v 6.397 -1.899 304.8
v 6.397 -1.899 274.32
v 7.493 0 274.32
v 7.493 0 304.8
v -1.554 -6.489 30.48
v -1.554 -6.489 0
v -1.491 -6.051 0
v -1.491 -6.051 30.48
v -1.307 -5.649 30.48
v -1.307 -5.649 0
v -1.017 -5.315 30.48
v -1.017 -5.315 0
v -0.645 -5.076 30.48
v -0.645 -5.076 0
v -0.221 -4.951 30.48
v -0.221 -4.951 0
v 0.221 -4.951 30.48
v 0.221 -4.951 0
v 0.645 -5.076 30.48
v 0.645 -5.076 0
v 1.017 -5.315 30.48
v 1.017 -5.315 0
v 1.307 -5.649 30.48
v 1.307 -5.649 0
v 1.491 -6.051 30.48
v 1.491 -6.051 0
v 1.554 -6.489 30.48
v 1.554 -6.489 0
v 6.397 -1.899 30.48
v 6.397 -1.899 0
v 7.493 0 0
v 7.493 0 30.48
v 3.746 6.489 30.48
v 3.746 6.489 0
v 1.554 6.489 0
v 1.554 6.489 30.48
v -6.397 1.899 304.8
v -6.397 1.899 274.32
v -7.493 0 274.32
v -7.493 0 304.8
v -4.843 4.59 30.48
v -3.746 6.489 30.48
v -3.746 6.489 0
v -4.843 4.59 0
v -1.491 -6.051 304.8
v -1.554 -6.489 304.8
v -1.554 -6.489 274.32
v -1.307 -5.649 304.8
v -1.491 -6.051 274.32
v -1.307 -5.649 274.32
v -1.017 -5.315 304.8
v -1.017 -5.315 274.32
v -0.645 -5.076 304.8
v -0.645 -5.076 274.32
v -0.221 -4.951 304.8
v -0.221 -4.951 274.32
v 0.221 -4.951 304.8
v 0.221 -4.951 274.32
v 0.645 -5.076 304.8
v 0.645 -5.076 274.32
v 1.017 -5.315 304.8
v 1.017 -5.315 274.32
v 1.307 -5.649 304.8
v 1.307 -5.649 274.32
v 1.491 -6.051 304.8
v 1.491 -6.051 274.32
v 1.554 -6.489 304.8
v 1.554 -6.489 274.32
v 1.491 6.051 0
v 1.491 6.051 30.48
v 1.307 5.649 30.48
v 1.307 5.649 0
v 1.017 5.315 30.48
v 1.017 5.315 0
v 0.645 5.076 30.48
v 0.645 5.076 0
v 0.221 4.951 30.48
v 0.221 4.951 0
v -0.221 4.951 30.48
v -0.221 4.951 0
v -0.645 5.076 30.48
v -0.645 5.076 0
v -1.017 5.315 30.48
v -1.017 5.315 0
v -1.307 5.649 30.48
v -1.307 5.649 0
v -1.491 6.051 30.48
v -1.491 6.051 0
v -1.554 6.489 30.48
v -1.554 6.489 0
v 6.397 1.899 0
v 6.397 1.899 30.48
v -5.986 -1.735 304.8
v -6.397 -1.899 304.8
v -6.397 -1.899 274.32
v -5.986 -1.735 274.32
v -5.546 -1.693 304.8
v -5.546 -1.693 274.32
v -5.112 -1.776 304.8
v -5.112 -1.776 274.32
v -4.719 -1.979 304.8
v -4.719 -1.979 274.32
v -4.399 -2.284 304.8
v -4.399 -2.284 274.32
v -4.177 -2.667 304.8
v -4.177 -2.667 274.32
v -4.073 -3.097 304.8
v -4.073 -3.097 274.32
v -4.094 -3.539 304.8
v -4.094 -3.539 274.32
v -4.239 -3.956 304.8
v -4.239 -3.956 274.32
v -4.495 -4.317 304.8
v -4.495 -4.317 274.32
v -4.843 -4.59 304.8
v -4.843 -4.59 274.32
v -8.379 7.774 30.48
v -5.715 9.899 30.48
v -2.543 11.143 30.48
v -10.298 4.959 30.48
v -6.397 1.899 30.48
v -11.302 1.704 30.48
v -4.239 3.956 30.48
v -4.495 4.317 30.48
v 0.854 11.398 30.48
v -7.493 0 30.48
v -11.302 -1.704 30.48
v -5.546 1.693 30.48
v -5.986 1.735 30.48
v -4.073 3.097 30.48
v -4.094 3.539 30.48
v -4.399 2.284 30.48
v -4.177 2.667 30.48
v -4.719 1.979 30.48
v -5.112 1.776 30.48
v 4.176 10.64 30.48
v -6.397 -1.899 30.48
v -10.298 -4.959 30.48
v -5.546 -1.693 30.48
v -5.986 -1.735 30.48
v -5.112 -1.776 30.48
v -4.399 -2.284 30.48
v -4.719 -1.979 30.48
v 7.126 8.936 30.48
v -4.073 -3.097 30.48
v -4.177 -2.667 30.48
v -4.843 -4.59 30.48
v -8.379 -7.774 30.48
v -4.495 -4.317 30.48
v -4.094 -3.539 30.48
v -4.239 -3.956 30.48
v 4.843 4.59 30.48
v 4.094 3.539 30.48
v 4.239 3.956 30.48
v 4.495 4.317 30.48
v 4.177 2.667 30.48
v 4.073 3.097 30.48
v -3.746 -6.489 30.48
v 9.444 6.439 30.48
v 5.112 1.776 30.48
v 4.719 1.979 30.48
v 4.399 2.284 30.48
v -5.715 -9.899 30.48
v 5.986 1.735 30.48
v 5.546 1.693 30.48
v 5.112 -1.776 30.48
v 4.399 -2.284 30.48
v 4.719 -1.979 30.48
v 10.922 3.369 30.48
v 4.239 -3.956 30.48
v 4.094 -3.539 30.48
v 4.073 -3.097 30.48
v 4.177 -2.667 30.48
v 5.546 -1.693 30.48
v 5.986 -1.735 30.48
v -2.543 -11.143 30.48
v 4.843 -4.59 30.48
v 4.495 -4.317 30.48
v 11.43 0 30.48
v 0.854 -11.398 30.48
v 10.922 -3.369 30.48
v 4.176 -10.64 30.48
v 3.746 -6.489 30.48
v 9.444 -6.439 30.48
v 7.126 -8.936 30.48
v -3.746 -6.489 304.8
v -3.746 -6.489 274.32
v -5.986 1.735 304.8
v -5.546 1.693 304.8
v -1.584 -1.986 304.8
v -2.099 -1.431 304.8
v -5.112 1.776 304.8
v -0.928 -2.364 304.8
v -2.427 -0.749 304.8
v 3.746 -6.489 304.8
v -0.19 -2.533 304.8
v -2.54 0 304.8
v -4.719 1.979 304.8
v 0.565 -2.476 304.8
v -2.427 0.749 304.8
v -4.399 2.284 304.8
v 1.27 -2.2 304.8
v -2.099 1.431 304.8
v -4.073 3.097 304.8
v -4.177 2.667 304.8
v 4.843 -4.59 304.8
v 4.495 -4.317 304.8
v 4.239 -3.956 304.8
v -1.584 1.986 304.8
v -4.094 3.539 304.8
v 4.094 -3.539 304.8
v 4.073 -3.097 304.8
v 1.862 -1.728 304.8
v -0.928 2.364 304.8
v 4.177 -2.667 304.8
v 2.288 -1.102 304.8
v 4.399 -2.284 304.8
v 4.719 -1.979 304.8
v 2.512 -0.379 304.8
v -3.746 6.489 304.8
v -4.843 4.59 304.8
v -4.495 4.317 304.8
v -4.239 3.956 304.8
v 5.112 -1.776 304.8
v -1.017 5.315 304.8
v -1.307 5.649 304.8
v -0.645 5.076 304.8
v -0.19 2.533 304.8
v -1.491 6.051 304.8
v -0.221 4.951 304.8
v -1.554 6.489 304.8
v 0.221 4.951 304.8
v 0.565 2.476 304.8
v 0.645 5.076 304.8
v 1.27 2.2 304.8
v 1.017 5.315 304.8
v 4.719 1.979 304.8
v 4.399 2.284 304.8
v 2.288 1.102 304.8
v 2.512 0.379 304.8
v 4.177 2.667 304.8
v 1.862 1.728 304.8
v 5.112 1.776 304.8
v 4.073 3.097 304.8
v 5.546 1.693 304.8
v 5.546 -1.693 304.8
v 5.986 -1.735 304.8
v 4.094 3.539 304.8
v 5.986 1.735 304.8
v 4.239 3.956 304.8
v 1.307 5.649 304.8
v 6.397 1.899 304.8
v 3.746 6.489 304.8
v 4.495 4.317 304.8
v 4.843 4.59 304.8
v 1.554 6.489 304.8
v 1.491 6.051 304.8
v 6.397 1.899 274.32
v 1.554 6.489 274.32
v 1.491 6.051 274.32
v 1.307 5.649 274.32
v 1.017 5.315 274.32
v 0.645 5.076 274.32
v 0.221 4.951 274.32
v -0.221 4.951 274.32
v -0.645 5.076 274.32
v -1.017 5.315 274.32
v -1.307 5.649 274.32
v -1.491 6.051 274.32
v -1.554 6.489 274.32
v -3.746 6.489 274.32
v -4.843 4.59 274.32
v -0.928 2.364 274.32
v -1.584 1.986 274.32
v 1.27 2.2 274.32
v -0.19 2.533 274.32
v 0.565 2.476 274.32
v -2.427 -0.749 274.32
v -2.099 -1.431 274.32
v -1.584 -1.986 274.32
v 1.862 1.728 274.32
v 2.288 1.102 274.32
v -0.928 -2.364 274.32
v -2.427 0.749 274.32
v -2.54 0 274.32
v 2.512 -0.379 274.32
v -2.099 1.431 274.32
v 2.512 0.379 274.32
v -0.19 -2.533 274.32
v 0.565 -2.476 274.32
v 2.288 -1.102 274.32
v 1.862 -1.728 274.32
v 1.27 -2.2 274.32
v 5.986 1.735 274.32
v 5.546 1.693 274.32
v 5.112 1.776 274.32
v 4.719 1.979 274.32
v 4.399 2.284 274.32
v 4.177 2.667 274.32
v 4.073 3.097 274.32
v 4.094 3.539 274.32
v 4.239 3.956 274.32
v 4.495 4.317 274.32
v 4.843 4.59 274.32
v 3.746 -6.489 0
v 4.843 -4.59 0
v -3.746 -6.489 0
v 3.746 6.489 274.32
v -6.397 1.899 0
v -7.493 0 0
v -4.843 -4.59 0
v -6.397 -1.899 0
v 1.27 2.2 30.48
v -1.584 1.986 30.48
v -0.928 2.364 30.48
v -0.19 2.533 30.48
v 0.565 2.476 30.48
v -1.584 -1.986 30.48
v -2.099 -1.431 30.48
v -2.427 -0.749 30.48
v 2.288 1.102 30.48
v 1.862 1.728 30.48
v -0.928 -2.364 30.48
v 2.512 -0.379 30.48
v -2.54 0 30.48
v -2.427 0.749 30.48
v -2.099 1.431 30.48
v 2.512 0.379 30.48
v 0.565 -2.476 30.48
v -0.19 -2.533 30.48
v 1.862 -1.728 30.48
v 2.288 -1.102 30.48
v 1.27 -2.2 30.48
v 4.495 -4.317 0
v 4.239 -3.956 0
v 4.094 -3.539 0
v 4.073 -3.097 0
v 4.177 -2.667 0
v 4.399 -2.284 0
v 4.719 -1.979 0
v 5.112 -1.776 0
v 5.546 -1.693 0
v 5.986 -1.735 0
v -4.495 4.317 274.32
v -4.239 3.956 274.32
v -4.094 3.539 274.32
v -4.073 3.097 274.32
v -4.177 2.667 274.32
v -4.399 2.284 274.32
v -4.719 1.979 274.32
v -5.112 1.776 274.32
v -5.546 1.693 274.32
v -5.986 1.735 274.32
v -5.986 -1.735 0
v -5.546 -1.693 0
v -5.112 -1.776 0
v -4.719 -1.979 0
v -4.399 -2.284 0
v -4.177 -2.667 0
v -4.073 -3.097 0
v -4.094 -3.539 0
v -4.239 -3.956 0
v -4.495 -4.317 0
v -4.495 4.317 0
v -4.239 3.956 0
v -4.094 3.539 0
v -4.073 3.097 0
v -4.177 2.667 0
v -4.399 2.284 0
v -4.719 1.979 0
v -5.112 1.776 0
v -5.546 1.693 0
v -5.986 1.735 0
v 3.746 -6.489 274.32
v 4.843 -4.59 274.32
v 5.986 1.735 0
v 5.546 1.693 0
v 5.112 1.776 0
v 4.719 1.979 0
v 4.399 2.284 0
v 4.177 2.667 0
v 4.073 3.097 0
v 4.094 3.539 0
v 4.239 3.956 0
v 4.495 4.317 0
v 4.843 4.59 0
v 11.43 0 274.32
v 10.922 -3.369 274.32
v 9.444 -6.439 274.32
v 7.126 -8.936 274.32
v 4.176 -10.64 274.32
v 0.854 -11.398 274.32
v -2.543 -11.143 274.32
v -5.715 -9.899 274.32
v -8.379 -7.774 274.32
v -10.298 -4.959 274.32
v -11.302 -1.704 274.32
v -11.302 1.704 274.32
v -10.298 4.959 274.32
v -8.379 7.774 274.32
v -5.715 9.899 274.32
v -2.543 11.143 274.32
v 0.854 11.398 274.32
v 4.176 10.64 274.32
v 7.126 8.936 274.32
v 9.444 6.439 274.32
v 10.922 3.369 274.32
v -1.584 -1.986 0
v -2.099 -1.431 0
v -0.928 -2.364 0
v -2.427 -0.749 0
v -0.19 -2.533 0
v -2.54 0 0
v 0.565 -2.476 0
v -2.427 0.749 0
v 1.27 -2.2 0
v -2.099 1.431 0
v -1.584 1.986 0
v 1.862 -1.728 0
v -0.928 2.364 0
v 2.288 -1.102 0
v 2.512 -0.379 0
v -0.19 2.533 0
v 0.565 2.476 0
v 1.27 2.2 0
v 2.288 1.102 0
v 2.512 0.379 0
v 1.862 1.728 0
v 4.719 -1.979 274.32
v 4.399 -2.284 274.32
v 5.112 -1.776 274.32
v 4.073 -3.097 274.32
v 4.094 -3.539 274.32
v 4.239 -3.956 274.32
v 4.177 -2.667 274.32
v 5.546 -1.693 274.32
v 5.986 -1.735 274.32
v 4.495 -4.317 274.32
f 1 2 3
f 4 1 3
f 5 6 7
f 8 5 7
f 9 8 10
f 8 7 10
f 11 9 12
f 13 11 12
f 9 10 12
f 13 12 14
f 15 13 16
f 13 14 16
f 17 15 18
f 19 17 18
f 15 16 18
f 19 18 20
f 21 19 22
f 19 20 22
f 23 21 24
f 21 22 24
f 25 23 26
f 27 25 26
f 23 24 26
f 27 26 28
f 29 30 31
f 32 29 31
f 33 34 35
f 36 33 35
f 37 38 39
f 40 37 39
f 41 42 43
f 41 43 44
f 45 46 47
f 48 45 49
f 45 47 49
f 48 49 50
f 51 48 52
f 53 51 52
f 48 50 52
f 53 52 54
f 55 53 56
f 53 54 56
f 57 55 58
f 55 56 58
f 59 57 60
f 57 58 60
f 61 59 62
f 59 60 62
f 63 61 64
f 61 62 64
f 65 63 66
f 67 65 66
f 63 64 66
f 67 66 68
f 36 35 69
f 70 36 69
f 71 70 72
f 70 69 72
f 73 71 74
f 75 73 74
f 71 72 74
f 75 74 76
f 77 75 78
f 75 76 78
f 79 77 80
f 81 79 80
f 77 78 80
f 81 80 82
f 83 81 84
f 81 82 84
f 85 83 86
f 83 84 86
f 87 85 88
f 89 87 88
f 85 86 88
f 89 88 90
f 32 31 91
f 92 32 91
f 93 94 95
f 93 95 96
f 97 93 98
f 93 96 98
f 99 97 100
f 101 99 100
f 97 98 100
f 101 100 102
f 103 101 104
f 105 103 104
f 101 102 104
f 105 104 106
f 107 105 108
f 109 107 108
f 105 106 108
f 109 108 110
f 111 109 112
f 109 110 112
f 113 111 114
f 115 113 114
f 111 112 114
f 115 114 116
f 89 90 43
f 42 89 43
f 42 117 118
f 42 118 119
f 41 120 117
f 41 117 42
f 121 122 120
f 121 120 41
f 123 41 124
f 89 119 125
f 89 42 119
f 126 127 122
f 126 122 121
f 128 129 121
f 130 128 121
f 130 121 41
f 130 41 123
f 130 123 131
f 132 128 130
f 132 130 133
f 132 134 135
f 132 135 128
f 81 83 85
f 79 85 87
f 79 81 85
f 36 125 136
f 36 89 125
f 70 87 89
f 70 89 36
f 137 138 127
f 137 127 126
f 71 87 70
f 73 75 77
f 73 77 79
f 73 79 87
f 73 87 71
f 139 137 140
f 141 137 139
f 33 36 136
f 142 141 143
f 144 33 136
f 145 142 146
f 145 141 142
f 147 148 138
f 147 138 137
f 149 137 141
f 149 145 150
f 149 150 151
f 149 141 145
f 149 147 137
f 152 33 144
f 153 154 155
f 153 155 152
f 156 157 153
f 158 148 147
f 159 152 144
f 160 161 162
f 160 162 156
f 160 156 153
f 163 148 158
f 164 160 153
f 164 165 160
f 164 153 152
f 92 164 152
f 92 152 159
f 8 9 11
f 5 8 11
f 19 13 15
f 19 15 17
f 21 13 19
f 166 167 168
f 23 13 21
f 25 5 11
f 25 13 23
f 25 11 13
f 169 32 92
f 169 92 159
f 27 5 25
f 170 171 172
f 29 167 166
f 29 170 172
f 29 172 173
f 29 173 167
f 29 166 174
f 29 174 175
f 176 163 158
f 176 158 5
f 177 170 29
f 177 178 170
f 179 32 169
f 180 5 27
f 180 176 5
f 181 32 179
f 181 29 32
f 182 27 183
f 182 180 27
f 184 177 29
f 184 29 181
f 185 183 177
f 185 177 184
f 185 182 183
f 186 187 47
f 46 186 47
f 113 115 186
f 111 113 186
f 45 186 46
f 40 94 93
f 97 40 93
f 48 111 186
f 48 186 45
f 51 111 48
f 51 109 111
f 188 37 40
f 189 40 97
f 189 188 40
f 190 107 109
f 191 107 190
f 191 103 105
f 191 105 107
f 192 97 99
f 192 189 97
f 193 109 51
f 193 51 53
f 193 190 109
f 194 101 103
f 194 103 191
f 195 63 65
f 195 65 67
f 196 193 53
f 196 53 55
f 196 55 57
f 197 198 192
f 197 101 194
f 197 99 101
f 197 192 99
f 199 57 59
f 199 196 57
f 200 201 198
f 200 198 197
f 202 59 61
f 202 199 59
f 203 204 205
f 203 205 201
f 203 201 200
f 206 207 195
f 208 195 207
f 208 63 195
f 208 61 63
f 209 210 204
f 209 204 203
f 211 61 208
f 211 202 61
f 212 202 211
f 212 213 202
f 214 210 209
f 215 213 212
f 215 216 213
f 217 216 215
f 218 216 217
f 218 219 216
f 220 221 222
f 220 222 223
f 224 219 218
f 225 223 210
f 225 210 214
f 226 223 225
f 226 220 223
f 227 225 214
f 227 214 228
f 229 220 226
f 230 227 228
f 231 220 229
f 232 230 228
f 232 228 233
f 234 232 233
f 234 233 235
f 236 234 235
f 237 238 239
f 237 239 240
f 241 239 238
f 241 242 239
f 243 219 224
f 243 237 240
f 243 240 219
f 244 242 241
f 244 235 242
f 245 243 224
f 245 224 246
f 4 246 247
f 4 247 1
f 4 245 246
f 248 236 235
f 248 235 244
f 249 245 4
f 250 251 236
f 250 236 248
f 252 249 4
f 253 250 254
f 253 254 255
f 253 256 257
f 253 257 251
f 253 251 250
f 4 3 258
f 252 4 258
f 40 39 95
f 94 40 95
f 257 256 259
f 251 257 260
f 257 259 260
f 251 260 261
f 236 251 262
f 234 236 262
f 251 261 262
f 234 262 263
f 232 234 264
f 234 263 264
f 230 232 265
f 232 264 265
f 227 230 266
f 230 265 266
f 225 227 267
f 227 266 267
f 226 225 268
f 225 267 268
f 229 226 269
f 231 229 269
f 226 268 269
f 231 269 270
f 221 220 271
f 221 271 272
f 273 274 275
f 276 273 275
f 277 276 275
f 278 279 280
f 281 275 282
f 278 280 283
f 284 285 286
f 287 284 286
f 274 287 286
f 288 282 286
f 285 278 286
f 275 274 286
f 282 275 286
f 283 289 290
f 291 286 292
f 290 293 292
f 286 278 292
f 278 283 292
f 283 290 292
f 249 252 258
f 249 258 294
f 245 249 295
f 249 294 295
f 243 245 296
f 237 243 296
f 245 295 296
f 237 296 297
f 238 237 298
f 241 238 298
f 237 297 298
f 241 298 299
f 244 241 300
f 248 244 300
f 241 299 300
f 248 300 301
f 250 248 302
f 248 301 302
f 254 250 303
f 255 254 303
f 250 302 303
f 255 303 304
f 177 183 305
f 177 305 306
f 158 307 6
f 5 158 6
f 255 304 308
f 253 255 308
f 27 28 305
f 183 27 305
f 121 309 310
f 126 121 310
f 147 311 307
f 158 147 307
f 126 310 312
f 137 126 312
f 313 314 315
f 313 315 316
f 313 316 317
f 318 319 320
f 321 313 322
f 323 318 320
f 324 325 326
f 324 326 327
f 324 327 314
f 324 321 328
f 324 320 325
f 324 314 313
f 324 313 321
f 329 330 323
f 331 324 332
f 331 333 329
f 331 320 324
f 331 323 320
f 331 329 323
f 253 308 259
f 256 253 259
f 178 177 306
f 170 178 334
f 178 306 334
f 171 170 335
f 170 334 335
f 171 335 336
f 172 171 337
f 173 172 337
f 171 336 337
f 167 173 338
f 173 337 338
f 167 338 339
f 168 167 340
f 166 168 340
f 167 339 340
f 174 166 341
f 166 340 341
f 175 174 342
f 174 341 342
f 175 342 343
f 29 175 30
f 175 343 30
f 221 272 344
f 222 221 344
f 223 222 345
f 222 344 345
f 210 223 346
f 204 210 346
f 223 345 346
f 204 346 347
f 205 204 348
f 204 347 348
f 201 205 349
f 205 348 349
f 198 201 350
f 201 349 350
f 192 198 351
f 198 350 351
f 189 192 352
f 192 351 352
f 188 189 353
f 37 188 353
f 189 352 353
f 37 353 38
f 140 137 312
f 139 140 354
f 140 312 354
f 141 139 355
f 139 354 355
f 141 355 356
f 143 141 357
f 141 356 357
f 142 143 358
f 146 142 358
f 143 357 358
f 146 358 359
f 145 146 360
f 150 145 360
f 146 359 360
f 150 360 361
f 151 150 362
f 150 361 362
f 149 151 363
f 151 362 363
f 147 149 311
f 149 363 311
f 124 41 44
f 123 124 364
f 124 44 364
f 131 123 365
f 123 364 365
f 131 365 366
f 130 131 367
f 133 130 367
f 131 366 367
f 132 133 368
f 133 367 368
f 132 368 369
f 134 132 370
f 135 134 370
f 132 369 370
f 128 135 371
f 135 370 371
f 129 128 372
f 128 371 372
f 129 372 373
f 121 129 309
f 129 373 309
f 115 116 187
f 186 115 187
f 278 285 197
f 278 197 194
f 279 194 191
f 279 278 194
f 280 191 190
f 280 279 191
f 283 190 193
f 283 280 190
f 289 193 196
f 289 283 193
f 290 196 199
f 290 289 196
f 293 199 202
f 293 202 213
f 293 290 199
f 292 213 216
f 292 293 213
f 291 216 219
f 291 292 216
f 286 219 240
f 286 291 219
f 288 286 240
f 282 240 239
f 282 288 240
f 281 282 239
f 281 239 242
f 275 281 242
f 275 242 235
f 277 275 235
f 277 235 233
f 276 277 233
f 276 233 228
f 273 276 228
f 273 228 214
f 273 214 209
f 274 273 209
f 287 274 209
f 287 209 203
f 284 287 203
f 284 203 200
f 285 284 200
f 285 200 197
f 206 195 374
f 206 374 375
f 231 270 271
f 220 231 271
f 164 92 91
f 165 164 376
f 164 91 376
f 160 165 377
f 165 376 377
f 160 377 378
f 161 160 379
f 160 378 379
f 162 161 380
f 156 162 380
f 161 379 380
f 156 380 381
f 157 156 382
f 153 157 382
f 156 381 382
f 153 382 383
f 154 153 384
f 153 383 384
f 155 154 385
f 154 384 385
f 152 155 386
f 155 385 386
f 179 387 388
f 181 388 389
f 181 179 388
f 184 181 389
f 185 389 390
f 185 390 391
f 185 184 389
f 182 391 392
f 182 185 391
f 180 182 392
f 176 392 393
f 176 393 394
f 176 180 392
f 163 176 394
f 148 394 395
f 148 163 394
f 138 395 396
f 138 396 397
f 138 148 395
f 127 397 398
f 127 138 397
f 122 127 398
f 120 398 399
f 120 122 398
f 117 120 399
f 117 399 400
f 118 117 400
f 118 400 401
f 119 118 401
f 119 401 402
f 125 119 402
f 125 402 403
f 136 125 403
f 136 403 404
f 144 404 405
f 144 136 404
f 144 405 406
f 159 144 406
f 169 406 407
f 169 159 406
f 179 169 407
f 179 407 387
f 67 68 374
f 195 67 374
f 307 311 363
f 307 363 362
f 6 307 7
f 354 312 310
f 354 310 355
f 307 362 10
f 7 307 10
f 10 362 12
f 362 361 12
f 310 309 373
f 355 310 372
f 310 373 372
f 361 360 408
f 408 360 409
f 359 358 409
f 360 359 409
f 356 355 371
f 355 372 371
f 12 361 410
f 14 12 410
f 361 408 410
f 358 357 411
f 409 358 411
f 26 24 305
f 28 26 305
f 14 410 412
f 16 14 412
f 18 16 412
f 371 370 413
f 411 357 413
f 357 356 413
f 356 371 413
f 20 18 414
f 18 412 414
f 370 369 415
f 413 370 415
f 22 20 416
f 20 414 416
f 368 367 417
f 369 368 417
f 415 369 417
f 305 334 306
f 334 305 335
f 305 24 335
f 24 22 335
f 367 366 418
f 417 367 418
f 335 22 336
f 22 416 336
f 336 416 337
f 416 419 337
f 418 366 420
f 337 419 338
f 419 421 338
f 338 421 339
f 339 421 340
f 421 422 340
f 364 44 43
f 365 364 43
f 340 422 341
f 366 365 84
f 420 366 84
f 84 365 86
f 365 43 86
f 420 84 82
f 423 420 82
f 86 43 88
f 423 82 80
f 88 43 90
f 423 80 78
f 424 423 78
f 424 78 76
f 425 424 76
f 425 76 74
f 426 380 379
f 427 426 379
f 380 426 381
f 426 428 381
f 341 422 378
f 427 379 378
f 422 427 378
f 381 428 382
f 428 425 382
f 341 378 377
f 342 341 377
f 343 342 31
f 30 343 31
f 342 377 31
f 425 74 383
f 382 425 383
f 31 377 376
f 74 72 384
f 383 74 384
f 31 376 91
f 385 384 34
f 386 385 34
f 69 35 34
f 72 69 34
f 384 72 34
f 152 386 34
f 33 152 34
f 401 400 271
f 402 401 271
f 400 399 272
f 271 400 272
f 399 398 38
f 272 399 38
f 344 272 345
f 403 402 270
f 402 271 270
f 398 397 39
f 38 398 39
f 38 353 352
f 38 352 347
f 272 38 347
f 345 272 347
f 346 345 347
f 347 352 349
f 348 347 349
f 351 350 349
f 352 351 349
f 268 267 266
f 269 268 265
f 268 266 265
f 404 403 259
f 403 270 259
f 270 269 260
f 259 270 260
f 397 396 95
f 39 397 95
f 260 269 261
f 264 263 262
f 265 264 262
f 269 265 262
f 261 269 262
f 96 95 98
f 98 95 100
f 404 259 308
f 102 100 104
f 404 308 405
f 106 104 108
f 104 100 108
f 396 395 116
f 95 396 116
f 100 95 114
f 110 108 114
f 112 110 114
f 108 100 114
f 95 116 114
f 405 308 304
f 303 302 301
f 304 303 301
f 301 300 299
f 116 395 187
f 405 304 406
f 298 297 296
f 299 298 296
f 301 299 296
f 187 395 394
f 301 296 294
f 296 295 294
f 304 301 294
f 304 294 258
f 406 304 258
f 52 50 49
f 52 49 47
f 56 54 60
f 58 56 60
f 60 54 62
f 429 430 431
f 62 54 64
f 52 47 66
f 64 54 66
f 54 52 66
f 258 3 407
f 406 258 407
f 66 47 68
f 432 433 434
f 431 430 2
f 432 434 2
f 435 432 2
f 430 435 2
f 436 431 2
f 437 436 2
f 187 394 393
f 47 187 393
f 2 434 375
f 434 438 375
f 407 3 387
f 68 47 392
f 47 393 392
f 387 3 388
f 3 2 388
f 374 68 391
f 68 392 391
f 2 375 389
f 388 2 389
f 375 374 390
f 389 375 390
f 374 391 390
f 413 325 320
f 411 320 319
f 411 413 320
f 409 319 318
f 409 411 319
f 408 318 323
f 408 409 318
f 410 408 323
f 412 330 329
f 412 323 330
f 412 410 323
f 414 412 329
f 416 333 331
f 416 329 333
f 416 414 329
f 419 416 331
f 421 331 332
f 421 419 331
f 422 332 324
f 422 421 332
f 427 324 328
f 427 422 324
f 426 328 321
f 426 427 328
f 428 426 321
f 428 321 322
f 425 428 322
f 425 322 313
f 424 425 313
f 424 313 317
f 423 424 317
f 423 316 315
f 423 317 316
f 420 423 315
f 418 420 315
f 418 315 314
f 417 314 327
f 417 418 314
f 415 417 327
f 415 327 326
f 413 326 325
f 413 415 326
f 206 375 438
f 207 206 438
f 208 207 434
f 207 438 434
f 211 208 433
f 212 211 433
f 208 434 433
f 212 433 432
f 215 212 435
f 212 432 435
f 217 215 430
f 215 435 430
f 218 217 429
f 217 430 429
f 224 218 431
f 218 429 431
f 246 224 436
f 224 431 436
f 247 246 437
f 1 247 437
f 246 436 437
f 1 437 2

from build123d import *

# Parameters (mm, degrees)
SKETCH1_R           = 2.54
BOSS_EXTRUDE1_DEPTH = 304.8
SKETCH2_R           = 11.43
BOSS_EXTRUDE2_DEPTH = 121.92


with BuildPart() as part:
    # Sketch1 → Boss-Extrude1 (new body)
    with BuildSketch(Plane.XY):
        with BuildLine():
            Line((7.493, 0), (6.396528537, 1.899144284))
            ThreePointArc((6.396528537, 1.899144284), (4.274330108, 2.467785639), (4.842971463, 4.589984067))
            Line((4.842971463, 4.589984067), (3.7465, 6.489128351))
            Line((3.7465, 6.489128351), (1.553557073, 6.489128351))
            ThreePointArc((1.553557073, 6.489128351), (0, 4.935571277), (-1.553557073, 6.489128351))
            Line((-1.553557073, 6.489128351), (-3.7465, 6.489128351))
            Line((-3.7465, 6.489128351), (-4.842971463, 4.589984067))
            ThreePointArc((-4.842971463, 4.589984067), (-4.274330108, 2.467785639), (-6.396528537, 1.899144284))
            Line((-6.396528537, 1.899144284), (-7.493, 0))
            Line((-7.493, 0), (-6.396528537, -1.899144284))
            ThreePointArc((-6.396528537, -1.899144284), (-4.274330108, -2.467785639), (-4.842971463, -4.589984067))
            Line((-4.842971463, -4.589984067), (-3.7465, -6.489128351))
            Line((-3.7465, -6.489128351), (-1.553557073, -6.489128351))
            ThreePointArc((-1.553557073, -6.489128351), (0, -4.935571277), (1.553557073, -6.489128351))
            Line((1.553557073, -6.489128351), (3.7465, -6.489128351))
            Line((3.7465, -6.489128351), (4.842971463, -4.589984067))
            ThreePointArc((4.842971463, -4.589984067), (4.274330108, -2.467785639), (6.396528537, -1.899144284))
            Line((6.396528537, -1.899144284), (7.493, 0))
        make_face()
        with Locations(Location((0, 0, 0), (0, 0, 180))):
            Circle(SKETCH1_R, mode=Mode.SUBTRACT)
    extrude(amount=BOSS_EXTRUDE1_DEPTH)

    # Sketch2 → Boss-Extrude2 (add, symmetric)
    with BuildSketch(Plane(origin=(0, 0, 152.4), x_dir=(-1, 0, 0), z_dir=(0, 0, -1))):
        with Locations(Location((0, 0, 0), (0, 0, 180))):
            Circle(SKETCH2_R)
    extrude(amount=BOSS_EXTRUDE2_DEPTH, both=True)


solid = part.part
